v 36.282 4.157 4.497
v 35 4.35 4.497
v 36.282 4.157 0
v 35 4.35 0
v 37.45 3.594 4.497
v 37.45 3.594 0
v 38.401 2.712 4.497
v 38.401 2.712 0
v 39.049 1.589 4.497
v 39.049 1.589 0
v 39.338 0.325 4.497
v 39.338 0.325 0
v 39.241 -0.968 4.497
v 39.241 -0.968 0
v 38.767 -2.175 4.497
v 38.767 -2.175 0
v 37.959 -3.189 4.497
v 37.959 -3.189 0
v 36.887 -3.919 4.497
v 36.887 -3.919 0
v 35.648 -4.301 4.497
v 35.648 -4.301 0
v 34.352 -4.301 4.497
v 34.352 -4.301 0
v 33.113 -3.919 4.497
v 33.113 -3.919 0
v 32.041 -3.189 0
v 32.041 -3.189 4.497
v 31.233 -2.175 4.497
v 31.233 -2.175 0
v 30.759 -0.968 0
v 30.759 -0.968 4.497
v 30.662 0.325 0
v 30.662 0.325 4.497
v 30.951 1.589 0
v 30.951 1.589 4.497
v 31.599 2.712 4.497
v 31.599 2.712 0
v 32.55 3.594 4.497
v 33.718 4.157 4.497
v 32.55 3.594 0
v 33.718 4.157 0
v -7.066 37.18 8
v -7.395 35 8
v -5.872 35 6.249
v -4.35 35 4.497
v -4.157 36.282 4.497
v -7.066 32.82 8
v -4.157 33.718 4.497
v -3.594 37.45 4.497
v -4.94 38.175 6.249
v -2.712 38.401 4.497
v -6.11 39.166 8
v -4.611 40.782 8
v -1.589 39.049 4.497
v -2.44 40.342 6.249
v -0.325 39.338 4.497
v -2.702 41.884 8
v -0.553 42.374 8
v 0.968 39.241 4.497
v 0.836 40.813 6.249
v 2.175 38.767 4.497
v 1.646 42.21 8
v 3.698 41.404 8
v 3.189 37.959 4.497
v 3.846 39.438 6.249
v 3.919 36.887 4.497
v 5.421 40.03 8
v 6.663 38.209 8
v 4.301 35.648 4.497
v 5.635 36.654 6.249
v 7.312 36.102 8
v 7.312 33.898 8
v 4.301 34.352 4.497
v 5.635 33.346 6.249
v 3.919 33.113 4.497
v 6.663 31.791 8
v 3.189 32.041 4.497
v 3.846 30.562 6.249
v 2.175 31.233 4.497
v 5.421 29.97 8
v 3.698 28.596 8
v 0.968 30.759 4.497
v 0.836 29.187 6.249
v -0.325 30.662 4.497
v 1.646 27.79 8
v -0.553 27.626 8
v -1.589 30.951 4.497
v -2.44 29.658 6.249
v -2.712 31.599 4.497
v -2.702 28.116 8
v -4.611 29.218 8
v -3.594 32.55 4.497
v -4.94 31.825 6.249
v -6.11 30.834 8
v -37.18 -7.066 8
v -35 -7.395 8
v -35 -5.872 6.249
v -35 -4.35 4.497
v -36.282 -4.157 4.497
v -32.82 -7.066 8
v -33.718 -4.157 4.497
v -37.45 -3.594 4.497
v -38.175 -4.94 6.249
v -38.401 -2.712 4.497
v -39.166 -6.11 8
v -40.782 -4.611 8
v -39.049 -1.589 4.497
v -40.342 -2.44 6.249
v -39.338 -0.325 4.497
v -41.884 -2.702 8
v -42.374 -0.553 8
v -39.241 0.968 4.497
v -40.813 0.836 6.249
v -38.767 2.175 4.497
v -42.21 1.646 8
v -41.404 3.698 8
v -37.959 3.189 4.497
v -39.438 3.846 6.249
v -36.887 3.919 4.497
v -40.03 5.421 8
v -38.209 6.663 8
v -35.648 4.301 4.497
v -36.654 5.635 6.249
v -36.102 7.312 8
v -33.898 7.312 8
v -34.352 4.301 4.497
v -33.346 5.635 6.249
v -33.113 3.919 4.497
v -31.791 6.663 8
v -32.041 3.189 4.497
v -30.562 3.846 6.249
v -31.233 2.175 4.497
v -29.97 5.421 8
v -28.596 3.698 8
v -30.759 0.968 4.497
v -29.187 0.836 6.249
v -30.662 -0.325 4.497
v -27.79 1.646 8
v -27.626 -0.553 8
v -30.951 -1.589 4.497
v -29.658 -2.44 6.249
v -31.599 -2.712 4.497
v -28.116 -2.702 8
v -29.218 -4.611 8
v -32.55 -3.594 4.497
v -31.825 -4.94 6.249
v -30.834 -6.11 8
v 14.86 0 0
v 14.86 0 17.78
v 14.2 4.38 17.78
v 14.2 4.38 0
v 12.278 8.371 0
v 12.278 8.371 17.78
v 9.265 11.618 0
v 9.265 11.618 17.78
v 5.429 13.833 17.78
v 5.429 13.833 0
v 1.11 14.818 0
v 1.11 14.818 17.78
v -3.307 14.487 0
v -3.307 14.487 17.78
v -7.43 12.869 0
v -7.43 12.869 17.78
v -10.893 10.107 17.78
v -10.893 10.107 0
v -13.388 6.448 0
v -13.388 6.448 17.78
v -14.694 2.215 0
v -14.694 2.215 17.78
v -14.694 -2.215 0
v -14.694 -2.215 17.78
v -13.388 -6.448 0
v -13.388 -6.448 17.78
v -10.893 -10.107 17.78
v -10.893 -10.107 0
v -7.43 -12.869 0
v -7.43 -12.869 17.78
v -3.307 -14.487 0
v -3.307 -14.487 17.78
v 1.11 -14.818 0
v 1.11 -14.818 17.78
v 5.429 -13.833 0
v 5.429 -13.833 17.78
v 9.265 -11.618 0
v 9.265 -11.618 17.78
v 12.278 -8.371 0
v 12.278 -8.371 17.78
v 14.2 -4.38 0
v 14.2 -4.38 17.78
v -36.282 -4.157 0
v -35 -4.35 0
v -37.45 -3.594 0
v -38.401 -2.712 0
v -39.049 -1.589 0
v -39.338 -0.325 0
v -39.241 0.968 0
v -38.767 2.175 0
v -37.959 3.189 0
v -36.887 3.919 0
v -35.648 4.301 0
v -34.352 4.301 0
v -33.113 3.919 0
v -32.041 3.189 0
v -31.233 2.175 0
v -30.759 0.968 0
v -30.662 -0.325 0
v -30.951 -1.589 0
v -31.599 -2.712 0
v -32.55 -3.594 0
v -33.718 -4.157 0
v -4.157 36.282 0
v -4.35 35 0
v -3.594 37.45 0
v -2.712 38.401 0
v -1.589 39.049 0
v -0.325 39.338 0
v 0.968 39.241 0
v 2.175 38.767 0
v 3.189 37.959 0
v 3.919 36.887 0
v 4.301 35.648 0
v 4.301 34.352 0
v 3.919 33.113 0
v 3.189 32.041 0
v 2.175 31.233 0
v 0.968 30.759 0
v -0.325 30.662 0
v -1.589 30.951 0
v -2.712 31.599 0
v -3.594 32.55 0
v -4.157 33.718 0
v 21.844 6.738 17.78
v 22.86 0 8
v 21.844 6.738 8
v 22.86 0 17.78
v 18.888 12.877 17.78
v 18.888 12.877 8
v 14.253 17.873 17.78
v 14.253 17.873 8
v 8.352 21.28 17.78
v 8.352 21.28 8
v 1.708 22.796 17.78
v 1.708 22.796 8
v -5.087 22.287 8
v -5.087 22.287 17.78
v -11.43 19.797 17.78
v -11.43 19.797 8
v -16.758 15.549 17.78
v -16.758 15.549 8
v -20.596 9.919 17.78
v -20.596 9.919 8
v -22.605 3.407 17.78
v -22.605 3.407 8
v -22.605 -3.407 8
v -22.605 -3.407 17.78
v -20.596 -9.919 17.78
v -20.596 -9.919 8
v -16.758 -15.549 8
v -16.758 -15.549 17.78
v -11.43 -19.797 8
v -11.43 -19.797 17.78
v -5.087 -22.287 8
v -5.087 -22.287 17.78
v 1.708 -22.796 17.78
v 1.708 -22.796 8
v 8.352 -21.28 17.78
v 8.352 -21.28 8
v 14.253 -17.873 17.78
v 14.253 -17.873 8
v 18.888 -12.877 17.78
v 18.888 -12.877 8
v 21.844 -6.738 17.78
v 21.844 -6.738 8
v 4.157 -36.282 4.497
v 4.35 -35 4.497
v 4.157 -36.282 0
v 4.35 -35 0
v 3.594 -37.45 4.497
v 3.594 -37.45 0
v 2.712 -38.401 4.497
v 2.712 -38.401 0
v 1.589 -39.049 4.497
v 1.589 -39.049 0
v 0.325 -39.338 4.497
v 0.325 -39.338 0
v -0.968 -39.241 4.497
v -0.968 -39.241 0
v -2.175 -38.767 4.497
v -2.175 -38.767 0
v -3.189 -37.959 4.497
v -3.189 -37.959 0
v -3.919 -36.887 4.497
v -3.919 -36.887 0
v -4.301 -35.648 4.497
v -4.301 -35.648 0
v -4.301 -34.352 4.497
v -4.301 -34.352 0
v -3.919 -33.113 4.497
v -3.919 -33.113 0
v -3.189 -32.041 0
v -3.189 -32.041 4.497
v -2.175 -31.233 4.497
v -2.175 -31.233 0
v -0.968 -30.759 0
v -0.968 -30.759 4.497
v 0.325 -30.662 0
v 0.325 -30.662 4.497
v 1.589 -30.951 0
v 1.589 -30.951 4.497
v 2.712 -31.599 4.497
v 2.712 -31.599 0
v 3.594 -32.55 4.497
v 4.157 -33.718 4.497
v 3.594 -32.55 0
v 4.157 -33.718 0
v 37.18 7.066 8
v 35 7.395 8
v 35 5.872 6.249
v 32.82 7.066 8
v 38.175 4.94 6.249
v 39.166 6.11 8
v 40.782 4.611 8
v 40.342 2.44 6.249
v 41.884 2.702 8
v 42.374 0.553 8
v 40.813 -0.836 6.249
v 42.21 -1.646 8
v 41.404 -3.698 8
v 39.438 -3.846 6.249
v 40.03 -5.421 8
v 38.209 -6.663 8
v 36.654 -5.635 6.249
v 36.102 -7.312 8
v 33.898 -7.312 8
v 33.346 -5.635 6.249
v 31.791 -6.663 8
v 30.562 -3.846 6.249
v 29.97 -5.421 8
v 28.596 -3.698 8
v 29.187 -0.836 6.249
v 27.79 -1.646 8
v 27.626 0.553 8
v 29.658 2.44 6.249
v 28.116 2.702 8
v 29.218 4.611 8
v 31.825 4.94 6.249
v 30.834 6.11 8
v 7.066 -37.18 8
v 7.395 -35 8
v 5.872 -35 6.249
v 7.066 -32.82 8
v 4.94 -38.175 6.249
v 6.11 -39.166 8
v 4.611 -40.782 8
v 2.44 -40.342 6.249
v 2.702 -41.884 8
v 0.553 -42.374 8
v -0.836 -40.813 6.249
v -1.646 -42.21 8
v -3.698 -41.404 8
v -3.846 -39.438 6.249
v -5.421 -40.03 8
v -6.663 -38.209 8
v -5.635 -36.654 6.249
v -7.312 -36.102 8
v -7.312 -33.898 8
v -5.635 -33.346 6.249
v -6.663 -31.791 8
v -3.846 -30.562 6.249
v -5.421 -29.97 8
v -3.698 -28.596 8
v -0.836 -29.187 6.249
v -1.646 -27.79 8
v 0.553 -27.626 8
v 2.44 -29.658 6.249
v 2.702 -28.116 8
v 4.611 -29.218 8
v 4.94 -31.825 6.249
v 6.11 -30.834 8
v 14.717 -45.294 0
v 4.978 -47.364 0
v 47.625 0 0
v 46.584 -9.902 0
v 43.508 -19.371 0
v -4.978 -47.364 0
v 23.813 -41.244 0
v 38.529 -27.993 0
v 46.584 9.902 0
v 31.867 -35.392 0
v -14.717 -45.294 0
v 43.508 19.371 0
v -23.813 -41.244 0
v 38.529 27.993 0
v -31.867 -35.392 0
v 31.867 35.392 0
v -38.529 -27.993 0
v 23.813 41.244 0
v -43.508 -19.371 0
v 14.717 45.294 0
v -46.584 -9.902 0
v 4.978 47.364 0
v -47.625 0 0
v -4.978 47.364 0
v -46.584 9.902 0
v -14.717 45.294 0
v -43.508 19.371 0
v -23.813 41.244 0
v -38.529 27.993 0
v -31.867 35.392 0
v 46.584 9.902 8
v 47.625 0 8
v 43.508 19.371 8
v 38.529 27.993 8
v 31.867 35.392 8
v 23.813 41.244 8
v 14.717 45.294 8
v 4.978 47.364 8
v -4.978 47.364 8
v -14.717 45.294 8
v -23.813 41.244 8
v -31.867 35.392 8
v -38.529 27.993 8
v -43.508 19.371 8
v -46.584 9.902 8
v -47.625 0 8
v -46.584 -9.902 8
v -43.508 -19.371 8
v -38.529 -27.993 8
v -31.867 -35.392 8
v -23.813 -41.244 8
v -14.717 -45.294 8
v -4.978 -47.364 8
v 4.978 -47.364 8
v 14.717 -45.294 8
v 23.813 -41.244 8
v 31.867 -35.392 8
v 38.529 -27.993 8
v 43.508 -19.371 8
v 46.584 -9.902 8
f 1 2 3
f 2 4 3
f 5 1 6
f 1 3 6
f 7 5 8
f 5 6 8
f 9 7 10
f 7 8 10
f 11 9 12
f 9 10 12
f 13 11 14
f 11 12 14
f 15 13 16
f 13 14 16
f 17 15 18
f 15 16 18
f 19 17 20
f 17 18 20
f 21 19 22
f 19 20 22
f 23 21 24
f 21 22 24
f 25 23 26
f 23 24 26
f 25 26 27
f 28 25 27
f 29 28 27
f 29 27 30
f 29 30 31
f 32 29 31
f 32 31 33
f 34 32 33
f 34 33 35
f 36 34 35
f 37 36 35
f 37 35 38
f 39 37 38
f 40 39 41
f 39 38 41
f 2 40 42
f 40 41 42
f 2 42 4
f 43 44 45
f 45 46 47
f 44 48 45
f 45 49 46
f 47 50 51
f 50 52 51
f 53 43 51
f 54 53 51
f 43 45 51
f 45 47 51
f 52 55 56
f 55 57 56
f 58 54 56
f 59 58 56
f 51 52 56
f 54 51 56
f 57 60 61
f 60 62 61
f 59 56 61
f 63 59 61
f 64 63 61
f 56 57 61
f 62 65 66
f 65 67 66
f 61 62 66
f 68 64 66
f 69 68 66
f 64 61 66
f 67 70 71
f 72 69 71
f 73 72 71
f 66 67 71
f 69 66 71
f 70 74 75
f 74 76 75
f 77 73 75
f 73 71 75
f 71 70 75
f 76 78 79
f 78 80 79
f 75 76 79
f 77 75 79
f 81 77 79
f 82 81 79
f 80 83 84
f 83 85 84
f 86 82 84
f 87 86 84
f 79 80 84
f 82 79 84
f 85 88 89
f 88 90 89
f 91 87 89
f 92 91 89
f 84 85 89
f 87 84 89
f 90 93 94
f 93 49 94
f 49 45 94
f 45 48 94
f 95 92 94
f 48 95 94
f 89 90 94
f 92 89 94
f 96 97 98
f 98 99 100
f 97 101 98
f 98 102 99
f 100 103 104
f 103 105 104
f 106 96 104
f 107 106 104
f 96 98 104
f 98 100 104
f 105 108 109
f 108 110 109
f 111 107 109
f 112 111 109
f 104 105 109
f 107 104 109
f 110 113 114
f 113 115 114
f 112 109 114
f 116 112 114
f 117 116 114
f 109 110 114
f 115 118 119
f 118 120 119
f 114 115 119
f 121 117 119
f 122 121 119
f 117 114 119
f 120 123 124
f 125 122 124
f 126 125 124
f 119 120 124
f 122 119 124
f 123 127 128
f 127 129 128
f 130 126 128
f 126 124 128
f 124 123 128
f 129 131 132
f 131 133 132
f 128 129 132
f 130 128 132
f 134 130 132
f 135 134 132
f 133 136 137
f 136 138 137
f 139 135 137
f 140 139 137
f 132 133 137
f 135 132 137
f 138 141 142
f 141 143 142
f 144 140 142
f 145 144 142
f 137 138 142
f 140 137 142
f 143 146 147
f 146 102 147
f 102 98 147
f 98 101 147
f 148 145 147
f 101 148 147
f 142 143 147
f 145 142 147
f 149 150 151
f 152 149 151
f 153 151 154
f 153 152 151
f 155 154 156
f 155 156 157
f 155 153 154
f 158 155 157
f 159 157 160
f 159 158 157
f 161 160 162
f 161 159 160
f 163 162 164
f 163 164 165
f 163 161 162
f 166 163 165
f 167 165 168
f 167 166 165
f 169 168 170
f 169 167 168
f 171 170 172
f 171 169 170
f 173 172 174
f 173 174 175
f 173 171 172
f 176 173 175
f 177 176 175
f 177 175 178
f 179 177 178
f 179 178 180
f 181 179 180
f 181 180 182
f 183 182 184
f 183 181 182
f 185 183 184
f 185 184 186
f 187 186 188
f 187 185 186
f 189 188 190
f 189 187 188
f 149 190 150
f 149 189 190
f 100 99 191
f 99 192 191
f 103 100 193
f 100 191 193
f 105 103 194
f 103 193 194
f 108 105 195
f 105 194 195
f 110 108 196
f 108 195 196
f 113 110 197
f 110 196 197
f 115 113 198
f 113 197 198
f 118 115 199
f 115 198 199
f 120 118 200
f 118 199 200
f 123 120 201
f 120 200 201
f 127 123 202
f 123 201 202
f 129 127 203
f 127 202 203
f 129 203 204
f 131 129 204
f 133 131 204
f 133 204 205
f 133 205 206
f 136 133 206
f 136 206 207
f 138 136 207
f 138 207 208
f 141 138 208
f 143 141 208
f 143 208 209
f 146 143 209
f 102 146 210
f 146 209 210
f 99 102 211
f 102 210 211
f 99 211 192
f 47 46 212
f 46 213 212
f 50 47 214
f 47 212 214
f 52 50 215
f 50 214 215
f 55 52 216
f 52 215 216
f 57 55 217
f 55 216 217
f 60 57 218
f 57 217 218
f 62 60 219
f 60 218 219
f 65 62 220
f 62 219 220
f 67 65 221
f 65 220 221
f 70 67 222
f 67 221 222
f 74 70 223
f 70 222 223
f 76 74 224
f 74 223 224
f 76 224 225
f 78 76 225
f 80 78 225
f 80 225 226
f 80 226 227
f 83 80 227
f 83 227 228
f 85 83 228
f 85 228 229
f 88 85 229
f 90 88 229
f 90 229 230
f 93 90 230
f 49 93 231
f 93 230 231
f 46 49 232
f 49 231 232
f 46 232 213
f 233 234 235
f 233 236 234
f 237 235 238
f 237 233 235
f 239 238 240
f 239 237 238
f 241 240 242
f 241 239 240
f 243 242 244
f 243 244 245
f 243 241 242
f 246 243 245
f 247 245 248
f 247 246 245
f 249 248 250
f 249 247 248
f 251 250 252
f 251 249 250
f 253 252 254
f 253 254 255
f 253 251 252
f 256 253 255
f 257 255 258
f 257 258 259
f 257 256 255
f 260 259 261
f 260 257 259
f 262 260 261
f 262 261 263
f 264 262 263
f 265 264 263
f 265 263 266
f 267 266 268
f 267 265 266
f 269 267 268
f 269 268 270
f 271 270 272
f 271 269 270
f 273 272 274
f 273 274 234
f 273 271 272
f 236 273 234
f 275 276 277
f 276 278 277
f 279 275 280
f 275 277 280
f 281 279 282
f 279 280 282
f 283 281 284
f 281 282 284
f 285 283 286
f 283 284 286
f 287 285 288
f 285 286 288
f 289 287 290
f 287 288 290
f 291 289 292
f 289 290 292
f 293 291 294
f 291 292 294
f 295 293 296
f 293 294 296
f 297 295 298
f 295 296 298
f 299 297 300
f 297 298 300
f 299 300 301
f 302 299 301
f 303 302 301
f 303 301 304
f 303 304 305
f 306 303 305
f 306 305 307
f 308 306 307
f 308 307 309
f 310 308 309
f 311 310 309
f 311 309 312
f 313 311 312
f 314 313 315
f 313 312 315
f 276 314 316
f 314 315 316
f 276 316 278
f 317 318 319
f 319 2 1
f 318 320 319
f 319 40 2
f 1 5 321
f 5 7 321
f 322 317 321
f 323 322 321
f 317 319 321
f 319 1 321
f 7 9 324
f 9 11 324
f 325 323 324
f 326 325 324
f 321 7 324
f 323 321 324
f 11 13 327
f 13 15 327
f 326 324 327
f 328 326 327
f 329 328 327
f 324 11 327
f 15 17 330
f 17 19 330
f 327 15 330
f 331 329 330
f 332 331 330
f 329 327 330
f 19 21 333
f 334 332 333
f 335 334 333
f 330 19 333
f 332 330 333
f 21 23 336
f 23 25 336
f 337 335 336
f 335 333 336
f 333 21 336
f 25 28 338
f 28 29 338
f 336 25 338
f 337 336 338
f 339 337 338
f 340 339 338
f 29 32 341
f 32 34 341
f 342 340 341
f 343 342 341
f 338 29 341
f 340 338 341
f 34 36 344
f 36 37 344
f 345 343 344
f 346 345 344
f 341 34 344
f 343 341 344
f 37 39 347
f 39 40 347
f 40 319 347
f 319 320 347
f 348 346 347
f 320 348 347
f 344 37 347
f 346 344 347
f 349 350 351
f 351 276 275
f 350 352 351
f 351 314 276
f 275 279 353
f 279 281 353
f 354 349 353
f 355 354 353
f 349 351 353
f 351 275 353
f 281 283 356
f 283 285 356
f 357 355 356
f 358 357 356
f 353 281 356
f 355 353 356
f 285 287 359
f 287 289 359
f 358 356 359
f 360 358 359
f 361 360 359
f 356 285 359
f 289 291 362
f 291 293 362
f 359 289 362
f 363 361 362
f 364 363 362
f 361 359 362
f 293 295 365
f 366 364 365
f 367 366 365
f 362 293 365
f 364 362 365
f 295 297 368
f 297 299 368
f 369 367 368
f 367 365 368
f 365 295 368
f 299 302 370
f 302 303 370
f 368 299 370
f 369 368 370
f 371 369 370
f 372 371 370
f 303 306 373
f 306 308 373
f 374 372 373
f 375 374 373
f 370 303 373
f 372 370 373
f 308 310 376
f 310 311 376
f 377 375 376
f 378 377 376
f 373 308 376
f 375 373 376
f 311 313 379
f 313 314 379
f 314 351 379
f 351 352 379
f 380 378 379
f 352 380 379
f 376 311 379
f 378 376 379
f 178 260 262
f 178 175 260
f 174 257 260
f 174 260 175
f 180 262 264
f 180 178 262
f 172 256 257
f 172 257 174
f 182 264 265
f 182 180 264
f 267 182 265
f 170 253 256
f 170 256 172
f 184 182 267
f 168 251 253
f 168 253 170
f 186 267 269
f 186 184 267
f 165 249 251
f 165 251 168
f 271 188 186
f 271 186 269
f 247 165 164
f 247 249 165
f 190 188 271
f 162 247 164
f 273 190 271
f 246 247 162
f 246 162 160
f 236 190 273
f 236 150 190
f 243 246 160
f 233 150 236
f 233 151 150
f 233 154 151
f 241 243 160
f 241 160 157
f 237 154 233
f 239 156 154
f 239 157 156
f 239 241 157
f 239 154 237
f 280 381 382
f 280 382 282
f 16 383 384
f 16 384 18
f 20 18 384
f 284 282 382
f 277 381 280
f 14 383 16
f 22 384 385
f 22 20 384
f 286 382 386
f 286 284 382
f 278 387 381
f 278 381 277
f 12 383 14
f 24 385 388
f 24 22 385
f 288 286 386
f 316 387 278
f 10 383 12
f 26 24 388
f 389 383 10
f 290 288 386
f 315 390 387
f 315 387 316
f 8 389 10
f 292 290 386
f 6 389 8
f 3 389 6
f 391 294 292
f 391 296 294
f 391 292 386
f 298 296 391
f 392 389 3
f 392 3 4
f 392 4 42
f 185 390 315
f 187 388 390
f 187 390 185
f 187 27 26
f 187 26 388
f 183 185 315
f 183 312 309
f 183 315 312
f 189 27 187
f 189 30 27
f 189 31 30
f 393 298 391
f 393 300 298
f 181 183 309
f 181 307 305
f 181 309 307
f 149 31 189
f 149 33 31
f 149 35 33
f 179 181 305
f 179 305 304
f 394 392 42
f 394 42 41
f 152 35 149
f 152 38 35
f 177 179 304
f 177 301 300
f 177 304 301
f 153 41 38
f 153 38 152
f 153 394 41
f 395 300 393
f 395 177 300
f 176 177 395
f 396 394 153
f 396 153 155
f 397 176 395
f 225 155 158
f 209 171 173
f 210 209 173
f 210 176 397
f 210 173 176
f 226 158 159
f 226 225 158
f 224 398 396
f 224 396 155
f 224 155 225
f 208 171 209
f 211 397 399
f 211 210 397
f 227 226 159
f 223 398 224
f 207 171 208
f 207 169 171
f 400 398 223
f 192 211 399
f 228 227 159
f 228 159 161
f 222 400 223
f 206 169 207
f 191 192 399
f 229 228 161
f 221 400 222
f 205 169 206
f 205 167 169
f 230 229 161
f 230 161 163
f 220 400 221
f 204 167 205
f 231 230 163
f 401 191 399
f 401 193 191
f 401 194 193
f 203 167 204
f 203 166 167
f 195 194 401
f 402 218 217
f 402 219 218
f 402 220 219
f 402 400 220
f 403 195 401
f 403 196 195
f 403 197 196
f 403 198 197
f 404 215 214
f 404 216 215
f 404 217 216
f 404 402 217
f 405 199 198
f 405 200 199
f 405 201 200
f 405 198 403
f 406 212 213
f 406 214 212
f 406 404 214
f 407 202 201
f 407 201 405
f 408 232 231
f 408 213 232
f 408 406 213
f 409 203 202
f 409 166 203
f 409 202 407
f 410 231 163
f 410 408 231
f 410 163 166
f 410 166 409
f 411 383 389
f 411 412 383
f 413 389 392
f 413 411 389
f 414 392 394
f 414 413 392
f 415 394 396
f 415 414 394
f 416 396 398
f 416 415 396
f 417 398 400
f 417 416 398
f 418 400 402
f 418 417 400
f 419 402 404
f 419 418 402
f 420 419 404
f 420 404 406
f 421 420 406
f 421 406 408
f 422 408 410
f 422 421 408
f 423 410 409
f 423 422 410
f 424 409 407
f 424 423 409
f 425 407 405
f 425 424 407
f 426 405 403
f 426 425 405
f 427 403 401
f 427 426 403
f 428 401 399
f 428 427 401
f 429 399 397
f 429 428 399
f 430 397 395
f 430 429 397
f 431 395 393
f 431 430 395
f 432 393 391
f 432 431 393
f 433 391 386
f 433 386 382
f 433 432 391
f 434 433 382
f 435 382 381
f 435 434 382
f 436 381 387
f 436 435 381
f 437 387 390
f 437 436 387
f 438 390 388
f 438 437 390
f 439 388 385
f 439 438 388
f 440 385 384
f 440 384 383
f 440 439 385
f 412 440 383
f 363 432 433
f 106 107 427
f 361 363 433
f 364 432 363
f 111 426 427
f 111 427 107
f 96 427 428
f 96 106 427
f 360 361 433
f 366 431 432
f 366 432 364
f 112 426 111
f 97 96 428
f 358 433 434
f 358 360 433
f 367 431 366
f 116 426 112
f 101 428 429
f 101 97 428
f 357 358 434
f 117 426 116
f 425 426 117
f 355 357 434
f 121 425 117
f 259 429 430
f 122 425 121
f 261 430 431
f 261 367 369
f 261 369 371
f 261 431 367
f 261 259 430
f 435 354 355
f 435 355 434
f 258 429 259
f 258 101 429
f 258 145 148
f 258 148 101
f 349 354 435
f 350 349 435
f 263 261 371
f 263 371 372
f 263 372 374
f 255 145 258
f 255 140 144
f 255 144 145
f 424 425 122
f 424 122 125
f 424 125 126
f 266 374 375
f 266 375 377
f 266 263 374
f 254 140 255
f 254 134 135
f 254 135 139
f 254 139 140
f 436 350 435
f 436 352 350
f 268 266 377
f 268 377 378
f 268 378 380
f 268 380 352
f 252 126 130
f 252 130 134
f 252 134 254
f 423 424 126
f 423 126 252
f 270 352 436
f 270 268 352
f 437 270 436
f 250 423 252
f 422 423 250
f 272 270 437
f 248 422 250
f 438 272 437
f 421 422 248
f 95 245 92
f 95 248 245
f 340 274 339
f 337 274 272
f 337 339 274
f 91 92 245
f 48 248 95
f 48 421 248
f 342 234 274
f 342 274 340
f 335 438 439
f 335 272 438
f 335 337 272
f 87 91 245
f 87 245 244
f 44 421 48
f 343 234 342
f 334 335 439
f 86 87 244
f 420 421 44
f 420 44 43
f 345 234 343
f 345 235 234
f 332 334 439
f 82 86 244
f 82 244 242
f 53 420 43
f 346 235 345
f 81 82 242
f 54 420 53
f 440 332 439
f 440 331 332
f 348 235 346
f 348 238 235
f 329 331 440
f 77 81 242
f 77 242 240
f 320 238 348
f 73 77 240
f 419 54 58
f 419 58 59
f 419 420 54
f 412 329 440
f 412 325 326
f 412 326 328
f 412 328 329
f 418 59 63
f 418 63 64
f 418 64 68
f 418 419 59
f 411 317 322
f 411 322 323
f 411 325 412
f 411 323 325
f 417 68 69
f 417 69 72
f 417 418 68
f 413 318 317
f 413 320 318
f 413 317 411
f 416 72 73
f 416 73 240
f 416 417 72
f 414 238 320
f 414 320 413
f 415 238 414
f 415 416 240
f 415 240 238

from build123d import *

# Parameters (mm, degrees)
HOLE_D             = 8.7
HOLE_DEPTH         = 25
HOLE_CSINK_D       = 14.79
HOLE_CSINK_ANGLE   = 82
POLARPATTERN_COUNT = 4


with BuildPart() as part:
    # Sketch → Revolution (revolve)
    with BuildSketch(Plane.XZ):
        Polygon((14.86, 0), (47.625, 0), (47.625, 8), (22.86, 8), (22.86, 17.78), (14.86, 17.78), align=None)
    revolve(axis=Axis((0, 0, 0), (0, 0, 1)))

    # Hole
    with Locations(Plane.XY.offset(8)):
        with Locations((0, 35)):
            hole = CounterSinkHole(HOLE_D / 2, HOLE_CSINK_D / 2, depth=HOLE_DEPTH, counter_sink_angle=HOLE_CSINK_ANGLE)

    # PolarPattern: Hole ×4 about axis
    polarpattern_axis = Axis((0, 0, 8), (0, 0, 1))
    for i in range(1, POLARPATTERN_COUNT):
        add(hole.rotate(polarpattern_axis, i * 360 / POLARPATTERN_COUNT), mode=Mode.SUBTRACT)


solid = part.part
